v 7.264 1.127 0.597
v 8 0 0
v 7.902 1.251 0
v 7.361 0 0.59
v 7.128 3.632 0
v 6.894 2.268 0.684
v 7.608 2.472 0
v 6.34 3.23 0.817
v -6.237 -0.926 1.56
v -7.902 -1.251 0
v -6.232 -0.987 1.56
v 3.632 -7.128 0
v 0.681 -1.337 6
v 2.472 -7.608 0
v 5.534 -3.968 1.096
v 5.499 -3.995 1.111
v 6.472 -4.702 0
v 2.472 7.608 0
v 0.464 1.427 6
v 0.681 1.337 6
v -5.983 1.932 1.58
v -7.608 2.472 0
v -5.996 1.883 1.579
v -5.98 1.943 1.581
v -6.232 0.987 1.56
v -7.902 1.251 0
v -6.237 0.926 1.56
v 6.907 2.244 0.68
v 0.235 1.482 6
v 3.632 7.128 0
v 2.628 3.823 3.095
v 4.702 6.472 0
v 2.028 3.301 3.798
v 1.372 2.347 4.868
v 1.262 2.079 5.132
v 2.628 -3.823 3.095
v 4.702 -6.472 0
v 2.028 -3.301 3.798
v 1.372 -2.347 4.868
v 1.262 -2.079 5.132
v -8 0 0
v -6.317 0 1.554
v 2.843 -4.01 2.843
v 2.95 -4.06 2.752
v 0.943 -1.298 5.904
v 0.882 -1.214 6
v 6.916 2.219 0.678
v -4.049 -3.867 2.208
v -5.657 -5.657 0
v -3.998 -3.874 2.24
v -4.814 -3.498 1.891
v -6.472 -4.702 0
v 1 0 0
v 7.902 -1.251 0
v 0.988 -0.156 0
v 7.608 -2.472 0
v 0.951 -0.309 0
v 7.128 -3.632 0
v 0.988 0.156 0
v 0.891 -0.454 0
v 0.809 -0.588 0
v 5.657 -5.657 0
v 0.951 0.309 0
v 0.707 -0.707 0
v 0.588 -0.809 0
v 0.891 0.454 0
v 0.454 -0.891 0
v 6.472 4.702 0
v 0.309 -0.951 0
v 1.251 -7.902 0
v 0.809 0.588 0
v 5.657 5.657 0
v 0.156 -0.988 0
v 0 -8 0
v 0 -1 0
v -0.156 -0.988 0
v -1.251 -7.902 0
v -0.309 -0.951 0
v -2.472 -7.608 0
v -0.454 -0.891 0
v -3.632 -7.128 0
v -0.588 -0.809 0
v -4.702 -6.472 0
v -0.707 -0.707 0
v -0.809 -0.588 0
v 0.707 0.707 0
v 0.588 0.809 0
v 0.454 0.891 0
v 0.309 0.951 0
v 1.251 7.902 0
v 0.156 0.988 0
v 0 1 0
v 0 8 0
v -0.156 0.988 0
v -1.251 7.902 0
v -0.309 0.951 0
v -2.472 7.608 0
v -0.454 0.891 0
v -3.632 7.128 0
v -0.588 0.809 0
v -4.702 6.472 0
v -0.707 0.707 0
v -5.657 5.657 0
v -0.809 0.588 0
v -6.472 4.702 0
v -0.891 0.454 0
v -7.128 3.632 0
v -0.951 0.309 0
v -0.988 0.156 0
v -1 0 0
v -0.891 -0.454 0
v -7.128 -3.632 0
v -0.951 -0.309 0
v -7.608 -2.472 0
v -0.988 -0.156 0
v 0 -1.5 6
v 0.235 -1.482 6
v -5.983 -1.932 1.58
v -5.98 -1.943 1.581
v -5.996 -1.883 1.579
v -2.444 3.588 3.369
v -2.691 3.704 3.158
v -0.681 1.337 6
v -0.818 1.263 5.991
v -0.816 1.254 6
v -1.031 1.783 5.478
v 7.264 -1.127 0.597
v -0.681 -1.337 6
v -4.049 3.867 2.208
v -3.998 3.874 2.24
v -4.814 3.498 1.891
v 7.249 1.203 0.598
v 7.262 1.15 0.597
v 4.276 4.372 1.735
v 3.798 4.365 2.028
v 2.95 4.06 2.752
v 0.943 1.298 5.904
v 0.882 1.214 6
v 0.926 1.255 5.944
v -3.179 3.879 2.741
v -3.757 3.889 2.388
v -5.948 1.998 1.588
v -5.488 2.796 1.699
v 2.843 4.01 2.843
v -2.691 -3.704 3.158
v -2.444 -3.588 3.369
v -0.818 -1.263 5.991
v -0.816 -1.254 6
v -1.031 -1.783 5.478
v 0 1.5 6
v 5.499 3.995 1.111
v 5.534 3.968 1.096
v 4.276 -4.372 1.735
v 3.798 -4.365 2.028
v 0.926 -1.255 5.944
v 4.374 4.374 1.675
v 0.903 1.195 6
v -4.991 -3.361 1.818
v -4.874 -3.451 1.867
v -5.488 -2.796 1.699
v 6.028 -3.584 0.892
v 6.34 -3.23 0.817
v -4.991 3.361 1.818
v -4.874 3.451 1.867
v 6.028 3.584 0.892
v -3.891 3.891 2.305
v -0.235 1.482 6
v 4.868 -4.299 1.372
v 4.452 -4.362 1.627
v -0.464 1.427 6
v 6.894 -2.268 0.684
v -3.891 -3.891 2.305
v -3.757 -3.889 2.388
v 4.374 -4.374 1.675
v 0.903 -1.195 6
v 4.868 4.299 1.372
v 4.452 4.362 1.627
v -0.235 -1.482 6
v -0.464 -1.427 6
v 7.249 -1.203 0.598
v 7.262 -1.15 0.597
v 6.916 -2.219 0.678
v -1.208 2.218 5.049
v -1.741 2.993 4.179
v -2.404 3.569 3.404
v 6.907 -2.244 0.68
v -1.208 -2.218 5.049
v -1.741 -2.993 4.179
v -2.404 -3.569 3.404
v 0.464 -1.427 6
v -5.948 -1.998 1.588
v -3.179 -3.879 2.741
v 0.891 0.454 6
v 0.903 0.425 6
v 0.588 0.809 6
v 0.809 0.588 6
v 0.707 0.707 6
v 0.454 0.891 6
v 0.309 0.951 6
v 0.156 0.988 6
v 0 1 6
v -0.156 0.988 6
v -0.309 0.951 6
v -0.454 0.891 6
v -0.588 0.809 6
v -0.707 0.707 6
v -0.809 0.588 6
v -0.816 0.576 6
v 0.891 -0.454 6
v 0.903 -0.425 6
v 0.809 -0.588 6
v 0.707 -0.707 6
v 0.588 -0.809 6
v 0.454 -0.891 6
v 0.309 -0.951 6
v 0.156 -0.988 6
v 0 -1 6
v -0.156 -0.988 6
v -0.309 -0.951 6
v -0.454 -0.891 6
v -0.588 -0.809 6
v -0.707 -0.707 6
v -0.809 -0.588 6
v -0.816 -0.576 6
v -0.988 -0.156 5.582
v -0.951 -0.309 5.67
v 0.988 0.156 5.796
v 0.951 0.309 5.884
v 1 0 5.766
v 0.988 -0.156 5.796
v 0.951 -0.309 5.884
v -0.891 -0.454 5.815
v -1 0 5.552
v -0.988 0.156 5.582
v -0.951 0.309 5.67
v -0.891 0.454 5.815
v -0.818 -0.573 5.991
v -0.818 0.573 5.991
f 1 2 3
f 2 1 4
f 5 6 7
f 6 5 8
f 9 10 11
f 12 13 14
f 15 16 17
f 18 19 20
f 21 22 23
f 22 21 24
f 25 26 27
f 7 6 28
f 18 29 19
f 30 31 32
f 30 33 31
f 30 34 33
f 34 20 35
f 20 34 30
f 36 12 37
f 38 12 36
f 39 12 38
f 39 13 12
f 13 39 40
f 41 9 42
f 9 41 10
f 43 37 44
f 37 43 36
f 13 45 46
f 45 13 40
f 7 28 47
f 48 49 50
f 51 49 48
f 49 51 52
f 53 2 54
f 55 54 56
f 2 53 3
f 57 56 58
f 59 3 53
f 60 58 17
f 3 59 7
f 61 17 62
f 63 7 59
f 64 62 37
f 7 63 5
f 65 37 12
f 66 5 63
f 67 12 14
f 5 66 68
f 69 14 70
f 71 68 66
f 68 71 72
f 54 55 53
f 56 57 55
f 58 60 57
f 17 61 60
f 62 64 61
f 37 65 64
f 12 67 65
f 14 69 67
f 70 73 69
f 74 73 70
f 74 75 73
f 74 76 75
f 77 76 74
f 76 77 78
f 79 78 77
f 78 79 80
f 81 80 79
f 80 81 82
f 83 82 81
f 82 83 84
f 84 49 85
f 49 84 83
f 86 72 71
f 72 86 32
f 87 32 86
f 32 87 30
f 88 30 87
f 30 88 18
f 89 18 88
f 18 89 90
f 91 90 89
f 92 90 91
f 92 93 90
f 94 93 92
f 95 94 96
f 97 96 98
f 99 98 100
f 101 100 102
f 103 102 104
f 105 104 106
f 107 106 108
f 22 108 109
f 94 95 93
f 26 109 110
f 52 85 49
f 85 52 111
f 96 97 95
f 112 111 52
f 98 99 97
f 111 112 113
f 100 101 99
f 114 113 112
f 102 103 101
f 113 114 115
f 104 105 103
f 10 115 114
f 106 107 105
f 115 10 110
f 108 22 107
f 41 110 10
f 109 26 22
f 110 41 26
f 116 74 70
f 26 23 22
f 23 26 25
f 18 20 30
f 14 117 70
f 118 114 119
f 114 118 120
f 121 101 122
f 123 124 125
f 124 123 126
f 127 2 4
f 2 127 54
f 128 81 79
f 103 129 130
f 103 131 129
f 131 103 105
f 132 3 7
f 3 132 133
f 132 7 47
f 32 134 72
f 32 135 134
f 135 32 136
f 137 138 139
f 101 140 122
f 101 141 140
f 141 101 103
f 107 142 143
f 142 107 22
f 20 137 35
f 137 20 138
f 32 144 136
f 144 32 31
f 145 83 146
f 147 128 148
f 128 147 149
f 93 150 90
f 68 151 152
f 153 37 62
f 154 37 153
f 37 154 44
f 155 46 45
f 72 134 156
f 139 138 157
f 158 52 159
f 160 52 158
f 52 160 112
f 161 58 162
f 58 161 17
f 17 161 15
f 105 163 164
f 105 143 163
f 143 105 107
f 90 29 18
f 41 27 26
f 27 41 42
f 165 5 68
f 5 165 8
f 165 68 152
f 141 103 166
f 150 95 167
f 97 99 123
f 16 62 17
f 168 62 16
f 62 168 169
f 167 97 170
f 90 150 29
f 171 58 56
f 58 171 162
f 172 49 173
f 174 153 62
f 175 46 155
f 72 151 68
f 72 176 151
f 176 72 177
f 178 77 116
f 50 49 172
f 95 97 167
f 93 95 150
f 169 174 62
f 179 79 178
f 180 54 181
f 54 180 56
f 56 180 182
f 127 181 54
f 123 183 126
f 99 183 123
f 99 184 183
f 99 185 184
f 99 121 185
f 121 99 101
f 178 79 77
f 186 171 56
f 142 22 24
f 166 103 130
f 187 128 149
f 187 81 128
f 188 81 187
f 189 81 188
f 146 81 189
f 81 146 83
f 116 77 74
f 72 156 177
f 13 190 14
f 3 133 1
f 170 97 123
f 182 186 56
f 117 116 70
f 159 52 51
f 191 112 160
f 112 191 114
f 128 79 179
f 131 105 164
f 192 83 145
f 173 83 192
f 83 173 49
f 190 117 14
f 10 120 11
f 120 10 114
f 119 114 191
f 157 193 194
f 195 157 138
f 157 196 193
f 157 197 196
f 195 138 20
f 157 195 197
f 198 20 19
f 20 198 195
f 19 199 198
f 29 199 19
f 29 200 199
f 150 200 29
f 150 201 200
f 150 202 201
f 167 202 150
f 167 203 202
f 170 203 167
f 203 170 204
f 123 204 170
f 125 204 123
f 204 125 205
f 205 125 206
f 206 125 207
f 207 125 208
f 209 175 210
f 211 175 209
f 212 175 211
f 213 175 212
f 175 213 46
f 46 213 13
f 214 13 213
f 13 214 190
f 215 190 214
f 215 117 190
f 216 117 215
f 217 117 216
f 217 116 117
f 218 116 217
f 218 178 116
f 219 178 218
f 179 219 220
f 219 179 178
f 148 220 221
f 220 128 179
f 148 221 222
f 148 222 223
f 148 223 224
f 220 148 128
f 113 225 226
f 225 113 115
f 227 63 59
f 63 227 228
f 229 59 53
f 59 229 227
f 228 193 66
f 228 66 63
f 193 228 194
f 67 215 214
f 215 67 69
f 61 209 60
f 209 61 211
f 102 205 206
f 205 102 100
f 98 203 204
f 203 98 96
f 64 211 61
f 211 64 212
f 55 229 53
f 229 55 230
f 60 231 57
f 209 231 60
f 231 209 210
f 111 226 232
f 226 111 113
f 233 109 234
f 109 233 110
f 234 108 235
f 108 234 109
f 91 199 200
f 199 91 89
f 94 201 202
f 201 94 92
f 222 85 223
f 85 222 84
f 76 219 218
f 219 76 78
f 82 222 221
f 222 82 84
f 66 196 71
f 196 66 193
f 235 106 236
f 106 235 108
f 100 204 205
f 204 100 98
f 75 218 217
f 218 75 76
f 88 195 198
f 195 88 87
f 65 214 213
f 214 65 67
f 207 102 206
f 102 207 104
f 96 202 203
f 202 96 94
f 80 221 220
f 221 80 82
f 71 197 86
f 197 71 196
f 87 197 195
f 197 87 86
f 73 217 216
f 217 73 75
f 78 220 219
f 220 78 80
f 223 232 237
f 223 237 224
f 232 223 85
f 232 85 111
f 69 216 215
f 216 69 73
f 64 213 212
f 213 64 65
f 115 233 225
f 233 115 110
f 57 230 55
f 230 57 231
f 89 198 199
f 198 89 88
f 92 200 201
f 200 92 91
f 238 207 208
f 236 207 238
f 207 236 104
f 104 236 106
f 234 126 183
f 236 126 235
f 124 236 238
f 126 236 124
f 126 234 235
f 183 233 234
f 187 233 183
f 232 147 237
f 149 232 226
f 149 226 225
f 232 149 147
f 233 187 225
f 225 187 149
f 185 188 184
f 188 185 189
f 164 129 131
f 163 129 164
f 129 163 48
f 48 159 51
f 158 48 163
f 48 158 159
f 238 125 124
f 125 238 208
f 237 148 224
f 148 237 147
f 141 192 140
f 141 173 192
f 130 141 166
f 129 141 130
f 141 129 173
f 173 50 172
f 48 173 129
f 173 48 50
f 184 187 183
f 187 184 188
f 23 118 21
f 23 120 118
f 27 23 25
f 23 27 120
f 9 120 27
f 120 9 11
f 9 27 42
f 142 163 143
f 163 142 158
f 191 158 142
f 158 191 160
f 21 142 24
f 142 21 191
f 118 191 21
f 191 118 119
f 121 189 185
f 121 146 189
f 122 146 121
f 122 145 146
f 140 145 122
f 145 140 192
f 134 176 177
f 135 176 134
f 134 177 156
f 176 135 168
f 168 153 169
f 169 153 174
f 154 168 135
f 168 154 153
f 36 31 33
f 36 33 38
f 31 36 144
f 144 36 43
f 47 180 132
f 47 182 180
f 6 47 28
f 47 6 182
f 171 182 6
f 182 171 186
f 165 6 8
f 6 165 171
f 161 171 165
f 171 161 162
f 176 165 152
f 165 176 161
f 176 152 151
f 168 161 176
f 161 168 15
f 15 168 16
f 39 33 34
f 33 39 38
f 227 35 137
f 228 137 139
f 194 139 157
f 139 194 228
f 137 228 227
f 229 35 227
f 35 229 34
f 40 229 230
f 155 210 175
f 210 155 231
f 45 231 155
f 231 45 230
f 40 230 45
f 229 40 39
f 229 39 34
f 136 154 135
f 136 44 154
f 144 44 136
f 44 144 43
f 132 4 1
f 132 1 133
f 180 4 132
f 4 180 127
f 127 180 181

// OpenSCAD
//bottom radius
r1=8;
//top radius
r2=1.5;
//hole radius
r3=1;
//height
h=6;
//left cylinder cutout
r4=6.5;
//right cylinder cutout
r5=8;
//clearance between bolt and top of hotend
clear1=1.5;
//clearance between bearing and top of hotend
clear2=0.5;

difference(){
	cylinder(r1=r1,r2=r2,h=h,$fn=40);
	translate([0,0,-0.05])
		cylinder(r=r3,h=h+0.1,$fn=40);
	translate([-r4-r3/2,25,clear1+r4])
		rotate([90,0,0])
			cylinder(r=r4,h=50,$fn=40);
	translate([r5+r3/2,25,clear2+r5])
		rotate([90,0,0])
			cylinder(r=r5,h=50,$fn=40);
}
